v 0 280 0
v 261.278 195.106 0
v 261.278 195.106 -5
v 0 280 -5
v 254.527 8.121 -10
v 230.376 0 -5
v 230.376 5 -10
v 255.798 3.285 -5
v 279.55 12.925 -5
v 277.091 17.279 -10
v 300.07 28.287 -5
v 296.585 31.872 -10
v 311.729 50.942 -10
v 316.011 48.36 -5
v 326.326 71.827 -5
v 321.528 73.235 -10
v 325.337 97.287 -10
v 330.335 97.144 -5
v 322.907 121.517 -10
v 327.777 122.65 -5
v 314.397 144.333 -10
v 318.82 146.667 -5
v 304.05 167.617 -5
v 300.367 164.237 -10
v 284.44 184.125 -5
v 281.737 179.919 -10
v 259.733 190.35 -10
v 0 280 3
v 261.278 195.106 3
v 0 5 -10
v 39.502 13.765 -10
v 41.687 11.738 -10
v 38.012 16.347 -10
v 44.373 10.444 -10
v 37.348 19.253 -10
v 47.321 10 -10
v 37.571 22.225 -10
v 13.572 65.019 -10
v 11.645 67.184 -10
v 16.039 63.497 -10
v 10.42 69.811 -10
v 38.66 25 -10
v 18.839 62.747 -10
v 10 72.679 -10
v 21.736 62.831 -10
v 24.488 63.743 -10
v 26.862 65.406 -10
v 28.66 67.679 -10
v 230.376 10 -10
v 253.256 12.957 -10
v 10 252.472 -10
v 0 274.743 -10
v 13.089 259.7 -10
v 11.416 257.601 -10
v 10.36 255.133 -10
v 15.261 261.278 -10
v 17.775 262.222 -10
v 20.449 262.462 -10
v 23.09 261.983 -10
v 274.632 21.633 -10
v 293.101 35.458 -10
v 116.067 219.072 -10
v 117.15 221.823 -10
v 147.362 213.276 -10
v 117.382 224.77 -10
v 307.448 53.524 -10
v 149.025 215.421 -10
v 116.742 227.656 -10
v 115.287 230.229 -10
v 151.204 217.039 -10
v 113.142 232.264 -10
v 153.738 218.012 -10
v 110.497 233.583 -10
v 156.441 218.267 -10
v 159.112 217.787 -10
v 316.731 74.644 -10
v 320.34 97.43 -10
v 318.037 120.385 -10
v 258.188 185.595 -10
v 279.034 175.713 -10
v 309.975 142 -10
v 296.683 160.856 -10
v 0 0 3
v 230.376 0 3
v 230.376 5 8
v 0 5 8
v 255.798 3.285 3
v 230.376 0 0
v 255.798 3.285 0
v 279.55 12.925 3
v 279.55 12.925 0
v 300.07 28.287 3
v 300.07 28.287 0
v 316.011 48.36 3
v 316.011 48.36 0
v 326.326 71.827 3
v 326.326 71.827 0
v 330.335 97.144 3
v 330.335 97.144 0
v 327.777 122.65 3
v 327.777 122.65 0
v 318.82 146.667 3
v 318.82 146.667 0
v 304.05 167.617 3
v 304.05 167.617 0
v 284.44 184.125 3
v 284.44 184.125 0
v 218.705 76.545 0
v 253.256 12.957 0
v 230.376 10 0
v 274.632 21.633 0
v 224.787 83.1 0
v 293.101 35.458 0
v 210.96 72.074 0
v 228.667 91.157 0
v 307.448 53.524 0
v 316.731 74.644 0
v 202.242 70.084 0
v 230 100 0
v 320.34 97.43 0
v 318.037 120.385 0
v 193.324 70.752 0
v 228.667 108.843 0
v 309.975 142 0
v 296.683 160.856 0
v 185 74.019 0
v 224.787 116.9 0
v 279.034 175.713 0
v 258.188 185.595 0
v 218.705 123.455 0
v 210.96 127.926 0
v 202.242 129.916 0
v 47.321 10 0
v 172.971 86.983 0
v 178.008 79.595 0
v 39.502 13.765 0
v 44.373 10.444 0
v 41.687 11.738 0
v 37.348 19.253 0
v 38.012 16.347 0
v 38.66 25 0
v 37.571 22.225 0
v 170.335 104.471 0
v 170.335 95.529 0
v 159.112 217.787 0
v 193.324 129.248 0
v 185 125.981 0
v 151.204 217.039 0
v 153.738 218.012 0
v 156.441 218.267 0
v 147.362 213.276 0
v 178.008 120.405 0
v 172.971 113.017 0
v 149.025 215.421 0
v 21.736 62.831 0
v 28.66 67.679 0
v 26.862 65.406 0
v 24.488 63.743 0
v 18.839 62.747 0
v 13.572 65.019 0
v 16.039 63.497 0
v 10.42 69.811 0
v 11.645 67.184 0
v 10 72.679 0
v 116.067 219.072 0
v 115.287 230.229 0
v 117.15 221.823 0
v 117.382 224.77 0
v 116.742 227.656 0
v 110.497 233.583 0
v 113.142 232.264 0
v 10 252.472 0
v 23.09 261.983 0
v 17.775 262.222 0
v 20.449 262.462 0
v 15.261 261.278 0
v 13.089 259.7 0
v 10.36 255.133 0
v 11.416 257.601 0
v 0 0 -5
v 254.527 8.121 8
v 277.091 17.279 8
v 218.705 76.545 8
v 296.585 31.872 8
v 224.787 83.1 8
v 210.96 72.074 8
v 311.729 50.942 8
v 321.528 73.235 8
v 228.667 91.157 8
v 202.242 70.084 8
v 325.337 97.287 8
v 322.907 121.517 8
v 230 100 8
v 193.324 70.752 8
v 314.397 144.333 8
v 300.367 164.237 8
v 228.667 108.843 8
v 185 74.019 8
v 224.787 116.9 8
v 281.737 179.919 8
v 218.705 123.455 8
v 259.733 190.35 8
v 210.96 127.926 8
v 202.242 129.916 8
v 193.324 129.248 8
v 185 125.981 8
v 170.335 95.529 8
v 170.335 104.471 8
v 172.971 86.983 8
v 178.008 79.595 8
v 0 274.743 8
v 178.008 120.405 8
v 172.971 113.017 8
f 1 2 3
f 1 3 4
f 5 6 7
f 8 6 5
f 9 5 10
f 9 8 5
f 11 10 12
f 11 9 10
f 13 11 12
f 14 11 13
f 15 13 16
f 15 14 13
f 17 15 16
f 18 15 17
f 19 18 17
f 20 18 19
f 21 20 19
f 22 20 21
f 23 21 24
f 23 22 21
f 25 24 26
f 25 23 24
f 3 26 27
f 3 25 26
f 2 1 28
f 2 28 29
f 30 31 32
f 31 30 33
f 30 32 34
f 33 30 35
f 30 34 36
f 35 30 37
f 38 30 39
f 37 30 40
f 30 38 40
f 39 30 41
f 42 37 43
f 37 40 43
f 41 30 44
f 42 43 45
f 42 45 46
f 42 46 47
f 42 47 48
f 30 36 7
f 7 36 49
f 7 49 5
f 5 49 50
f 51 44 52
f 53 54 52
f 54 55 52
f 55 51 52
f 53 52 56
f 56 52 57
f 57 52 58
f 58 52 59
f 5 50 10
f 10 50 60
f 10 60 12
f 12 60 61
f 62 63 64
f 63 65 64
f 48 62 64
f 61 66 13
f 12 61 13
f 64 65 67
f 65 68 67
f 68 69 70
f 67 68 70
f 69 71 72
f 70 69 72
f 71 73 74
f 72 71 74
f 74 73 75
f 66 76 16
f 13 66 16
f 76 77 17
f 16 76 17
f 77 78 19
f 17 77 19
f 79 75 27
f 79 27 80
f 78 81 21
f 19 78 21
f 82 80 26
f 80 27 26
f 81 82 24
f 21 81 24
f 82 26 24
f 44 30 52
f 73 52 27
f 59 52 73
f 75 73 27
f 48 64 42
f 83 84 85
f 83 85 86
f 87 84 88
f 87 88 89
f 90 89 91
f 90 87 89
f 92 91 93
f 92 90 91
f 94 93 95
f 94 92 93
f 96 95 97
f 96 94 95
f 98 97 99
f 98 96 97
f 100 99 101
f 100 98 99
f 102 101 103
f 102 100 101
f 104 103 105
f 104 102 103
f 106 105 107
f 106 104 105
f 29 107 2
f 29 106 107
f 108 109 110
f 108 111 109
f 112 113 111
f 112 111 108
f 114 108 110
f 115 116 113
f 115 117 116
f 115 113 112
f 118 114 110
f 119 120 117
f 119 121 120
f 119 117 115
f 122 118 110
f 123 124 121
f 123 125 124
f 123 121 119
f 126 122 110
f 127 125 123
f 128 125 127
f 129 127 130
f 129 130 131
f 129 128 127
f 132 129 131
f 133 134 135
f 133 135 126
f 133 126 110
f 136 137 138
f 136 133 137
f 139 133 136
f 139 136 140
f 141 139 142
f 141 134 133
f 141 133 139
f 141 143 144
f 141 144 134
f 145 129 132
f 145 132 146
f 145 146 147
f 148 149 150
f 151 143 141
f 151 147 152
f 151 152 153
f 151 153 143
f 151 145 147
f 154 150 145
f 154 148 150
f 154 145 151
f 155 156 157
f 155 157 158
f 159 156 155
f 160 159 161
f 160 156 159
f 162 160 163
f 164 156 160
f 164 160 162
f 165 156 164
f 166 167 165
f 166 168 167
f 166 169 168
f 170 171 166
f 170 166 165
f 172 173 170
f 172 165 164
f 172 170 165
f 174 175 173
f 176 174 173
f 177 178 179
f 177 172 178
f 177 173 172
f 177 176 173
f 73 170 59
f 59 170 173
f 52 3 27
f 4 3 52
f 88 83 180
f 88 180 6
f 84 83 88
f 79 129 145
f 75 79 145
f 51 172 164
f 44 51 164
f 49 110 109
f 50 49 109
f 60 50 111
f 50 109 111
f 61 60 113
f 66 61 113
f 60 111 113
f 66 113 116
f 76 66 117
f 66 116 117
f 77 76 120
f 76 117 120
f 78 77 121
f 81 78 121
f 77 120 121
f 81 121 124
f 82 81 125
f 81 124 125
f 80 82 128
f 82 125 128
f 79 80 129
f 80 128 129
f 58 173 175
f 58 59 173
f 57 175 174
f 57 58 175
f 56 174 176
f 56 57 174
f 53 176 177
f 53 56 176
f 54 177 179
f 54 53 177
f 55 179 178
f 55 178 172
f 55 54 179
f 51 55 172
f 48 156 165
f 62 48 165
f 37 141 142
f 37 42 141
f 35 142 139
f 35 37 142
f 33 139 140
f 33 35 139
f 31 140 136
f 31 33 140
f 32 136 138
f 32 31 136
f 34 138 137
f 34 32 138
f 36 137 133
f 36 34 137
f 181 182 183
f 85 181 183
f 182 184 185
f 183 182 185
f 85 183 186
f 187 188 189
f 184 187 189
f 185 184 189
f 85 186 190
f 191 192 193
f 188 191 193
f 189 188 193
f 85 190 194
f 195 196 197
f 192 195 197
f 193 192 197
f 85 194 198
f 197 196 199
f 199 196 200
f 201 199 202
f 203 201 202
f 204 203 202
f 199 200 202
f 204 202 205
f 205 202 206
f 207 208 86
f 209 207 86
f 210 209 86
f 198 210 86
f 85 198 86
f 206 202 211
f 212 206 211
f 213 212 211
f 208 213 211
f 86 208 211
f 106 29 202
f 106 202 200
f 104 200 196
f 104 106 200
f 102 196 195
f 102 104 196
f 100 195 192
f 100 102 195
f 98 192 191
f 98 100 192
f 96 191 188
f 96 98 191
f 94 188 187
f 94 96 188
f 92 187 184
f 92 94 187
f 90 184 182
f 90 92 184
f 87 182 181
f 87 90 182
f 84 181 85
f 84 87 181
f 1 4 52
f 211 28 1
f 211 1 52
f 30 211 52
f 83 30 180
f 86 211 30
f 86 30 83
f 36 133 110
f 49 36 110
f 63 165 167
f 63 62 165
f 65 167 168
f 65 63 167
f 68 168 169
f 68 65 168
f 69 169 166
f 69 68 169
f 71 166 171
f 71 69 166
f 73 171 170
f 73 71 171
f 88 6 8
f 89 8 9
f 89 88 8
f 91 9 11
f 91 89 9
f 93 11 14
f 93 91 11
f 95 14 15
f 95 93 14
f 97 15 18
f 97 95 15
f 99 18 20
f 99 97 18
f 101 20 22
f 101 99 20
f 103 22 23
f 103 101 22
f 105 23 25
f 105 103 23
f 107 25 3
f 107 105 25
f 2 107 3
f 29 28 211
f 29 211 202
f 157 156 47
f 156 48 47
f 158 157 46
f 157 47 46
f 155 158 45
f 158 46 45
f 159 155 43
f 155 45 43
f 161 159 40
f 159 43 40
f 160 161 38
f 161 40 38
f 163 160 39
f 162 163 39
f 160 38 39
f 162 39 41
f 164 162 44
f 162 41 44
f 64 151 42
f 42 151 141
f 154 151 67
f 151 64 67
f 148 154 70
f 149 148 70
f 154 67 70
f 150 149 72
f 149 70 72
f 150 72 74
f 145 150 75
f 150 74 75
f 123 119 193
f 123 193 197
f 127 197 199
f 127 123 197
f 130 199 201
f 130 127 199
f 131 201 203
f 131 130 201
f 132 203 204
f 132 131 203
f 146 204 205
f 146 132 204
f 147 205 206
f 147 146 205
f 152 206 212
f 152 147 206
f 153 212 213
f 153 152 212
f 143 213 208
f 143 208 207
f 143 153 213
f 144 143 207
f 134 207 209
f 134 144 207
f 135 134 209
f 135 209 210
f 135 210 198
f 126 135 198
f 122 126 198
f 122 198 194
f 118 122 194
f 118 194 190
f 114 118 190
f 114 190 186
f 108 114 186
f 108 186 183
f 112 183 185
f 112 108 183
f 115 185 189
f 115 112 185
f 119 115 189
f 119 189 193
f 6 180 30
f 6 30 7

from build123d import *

# Parameters (mm, degrees)
SKETCH_1_R      = 30
EXTRUDE_1_DEPTH = 8
FILLET_1_R      = 100
EXTRUDE_2_DEPTH = 10
FILLET_2_R      = 10
CHAMFER_1_SIZE  = 5


with BuildPart() as part:
    # 草图1 → 凸台-拉伸1 (new body)
    with BuildSketch(Plane.XY):
        Polygon((0, 0), (0, 280), (861.751390409, 0), align=None)
        with Locations((200, 100)):
            Circle(SKETCH_1_R, mode=Mode.SUBTRACT)
    extrude(amount=EXTRUDE_1_DEPTH)

    # 圆角1
    fillet_1_edges = [part.edges().sort_by_distance(p)[0] for p in [
        (861.751390409, 0, 4),
    ]]
    fillet(fillet_1_edges, radius=FILLET_1_R)

    # 草图2 → 凸台-拉伸2 (add)
    with BuildSketch(Plane.XY):
        with BuildLine():
            Line((0, 0), (230.376238942, 0))
            ThreePointArc((230.376238942, 0), (329.145073001, 84.356553496), (261.277938379, 195.10565163))
            Line((261.277938379, 195.10565163), (0, 280))
            Line((0, 280), (0, 0))
        make_face()
        Polygon((10, 266.236180795), (10, 35.358983849), (122.241374643, 229.766747442), align=None, mode=Mode.SUBTRACT)
        with BuildLine():
            Line((30, 10), (230.376238942, 10))
            ThreePointArc((230.376238942, 10), (319.268189595, 85.920898146), (258.187768435, 185.595086467))
            Line((258.187768435, 185.595086467), (151.410485182, 220.289128906))
            Line((151.410485182, 220.289128906), (30, 10))
        make_face(mode=Mode.SUBTRACT)
    extrude(amount=-EXTRUDE_2_DEPTH)

    # 圆角2
    fillet_2_edges = [part.edges().sort_by_distance(p)[0] for p in [
        (122.241374643, 229.766747442, -5),
        (10, 35.358983849, -5),
        (10, 266.236180795, -5),
        (151.410485182, 220.289128906, -5),
        (30, 10, -5),
    ]]
    fillet(fillet_2_edges, radius=FILLET_2_R)

    # 倒角1
    chamfer_1_edges = [part.edges().sort_by_distance(p)[0] for p in [
        (130.63896919, 237.552825815, 8),
        (329.145073001, 84.356553496, 8),
        (130.63896919, 237.552825815, -10),
        (329.145073001, 84.356553496, -10),
        (115.188119471, 0, -10),
        (115.188119471, 0, 8),
    ]]
    chamfer(chamfer_1_edges, length=CHAMFER_1_SIZE)


solid = part.part
